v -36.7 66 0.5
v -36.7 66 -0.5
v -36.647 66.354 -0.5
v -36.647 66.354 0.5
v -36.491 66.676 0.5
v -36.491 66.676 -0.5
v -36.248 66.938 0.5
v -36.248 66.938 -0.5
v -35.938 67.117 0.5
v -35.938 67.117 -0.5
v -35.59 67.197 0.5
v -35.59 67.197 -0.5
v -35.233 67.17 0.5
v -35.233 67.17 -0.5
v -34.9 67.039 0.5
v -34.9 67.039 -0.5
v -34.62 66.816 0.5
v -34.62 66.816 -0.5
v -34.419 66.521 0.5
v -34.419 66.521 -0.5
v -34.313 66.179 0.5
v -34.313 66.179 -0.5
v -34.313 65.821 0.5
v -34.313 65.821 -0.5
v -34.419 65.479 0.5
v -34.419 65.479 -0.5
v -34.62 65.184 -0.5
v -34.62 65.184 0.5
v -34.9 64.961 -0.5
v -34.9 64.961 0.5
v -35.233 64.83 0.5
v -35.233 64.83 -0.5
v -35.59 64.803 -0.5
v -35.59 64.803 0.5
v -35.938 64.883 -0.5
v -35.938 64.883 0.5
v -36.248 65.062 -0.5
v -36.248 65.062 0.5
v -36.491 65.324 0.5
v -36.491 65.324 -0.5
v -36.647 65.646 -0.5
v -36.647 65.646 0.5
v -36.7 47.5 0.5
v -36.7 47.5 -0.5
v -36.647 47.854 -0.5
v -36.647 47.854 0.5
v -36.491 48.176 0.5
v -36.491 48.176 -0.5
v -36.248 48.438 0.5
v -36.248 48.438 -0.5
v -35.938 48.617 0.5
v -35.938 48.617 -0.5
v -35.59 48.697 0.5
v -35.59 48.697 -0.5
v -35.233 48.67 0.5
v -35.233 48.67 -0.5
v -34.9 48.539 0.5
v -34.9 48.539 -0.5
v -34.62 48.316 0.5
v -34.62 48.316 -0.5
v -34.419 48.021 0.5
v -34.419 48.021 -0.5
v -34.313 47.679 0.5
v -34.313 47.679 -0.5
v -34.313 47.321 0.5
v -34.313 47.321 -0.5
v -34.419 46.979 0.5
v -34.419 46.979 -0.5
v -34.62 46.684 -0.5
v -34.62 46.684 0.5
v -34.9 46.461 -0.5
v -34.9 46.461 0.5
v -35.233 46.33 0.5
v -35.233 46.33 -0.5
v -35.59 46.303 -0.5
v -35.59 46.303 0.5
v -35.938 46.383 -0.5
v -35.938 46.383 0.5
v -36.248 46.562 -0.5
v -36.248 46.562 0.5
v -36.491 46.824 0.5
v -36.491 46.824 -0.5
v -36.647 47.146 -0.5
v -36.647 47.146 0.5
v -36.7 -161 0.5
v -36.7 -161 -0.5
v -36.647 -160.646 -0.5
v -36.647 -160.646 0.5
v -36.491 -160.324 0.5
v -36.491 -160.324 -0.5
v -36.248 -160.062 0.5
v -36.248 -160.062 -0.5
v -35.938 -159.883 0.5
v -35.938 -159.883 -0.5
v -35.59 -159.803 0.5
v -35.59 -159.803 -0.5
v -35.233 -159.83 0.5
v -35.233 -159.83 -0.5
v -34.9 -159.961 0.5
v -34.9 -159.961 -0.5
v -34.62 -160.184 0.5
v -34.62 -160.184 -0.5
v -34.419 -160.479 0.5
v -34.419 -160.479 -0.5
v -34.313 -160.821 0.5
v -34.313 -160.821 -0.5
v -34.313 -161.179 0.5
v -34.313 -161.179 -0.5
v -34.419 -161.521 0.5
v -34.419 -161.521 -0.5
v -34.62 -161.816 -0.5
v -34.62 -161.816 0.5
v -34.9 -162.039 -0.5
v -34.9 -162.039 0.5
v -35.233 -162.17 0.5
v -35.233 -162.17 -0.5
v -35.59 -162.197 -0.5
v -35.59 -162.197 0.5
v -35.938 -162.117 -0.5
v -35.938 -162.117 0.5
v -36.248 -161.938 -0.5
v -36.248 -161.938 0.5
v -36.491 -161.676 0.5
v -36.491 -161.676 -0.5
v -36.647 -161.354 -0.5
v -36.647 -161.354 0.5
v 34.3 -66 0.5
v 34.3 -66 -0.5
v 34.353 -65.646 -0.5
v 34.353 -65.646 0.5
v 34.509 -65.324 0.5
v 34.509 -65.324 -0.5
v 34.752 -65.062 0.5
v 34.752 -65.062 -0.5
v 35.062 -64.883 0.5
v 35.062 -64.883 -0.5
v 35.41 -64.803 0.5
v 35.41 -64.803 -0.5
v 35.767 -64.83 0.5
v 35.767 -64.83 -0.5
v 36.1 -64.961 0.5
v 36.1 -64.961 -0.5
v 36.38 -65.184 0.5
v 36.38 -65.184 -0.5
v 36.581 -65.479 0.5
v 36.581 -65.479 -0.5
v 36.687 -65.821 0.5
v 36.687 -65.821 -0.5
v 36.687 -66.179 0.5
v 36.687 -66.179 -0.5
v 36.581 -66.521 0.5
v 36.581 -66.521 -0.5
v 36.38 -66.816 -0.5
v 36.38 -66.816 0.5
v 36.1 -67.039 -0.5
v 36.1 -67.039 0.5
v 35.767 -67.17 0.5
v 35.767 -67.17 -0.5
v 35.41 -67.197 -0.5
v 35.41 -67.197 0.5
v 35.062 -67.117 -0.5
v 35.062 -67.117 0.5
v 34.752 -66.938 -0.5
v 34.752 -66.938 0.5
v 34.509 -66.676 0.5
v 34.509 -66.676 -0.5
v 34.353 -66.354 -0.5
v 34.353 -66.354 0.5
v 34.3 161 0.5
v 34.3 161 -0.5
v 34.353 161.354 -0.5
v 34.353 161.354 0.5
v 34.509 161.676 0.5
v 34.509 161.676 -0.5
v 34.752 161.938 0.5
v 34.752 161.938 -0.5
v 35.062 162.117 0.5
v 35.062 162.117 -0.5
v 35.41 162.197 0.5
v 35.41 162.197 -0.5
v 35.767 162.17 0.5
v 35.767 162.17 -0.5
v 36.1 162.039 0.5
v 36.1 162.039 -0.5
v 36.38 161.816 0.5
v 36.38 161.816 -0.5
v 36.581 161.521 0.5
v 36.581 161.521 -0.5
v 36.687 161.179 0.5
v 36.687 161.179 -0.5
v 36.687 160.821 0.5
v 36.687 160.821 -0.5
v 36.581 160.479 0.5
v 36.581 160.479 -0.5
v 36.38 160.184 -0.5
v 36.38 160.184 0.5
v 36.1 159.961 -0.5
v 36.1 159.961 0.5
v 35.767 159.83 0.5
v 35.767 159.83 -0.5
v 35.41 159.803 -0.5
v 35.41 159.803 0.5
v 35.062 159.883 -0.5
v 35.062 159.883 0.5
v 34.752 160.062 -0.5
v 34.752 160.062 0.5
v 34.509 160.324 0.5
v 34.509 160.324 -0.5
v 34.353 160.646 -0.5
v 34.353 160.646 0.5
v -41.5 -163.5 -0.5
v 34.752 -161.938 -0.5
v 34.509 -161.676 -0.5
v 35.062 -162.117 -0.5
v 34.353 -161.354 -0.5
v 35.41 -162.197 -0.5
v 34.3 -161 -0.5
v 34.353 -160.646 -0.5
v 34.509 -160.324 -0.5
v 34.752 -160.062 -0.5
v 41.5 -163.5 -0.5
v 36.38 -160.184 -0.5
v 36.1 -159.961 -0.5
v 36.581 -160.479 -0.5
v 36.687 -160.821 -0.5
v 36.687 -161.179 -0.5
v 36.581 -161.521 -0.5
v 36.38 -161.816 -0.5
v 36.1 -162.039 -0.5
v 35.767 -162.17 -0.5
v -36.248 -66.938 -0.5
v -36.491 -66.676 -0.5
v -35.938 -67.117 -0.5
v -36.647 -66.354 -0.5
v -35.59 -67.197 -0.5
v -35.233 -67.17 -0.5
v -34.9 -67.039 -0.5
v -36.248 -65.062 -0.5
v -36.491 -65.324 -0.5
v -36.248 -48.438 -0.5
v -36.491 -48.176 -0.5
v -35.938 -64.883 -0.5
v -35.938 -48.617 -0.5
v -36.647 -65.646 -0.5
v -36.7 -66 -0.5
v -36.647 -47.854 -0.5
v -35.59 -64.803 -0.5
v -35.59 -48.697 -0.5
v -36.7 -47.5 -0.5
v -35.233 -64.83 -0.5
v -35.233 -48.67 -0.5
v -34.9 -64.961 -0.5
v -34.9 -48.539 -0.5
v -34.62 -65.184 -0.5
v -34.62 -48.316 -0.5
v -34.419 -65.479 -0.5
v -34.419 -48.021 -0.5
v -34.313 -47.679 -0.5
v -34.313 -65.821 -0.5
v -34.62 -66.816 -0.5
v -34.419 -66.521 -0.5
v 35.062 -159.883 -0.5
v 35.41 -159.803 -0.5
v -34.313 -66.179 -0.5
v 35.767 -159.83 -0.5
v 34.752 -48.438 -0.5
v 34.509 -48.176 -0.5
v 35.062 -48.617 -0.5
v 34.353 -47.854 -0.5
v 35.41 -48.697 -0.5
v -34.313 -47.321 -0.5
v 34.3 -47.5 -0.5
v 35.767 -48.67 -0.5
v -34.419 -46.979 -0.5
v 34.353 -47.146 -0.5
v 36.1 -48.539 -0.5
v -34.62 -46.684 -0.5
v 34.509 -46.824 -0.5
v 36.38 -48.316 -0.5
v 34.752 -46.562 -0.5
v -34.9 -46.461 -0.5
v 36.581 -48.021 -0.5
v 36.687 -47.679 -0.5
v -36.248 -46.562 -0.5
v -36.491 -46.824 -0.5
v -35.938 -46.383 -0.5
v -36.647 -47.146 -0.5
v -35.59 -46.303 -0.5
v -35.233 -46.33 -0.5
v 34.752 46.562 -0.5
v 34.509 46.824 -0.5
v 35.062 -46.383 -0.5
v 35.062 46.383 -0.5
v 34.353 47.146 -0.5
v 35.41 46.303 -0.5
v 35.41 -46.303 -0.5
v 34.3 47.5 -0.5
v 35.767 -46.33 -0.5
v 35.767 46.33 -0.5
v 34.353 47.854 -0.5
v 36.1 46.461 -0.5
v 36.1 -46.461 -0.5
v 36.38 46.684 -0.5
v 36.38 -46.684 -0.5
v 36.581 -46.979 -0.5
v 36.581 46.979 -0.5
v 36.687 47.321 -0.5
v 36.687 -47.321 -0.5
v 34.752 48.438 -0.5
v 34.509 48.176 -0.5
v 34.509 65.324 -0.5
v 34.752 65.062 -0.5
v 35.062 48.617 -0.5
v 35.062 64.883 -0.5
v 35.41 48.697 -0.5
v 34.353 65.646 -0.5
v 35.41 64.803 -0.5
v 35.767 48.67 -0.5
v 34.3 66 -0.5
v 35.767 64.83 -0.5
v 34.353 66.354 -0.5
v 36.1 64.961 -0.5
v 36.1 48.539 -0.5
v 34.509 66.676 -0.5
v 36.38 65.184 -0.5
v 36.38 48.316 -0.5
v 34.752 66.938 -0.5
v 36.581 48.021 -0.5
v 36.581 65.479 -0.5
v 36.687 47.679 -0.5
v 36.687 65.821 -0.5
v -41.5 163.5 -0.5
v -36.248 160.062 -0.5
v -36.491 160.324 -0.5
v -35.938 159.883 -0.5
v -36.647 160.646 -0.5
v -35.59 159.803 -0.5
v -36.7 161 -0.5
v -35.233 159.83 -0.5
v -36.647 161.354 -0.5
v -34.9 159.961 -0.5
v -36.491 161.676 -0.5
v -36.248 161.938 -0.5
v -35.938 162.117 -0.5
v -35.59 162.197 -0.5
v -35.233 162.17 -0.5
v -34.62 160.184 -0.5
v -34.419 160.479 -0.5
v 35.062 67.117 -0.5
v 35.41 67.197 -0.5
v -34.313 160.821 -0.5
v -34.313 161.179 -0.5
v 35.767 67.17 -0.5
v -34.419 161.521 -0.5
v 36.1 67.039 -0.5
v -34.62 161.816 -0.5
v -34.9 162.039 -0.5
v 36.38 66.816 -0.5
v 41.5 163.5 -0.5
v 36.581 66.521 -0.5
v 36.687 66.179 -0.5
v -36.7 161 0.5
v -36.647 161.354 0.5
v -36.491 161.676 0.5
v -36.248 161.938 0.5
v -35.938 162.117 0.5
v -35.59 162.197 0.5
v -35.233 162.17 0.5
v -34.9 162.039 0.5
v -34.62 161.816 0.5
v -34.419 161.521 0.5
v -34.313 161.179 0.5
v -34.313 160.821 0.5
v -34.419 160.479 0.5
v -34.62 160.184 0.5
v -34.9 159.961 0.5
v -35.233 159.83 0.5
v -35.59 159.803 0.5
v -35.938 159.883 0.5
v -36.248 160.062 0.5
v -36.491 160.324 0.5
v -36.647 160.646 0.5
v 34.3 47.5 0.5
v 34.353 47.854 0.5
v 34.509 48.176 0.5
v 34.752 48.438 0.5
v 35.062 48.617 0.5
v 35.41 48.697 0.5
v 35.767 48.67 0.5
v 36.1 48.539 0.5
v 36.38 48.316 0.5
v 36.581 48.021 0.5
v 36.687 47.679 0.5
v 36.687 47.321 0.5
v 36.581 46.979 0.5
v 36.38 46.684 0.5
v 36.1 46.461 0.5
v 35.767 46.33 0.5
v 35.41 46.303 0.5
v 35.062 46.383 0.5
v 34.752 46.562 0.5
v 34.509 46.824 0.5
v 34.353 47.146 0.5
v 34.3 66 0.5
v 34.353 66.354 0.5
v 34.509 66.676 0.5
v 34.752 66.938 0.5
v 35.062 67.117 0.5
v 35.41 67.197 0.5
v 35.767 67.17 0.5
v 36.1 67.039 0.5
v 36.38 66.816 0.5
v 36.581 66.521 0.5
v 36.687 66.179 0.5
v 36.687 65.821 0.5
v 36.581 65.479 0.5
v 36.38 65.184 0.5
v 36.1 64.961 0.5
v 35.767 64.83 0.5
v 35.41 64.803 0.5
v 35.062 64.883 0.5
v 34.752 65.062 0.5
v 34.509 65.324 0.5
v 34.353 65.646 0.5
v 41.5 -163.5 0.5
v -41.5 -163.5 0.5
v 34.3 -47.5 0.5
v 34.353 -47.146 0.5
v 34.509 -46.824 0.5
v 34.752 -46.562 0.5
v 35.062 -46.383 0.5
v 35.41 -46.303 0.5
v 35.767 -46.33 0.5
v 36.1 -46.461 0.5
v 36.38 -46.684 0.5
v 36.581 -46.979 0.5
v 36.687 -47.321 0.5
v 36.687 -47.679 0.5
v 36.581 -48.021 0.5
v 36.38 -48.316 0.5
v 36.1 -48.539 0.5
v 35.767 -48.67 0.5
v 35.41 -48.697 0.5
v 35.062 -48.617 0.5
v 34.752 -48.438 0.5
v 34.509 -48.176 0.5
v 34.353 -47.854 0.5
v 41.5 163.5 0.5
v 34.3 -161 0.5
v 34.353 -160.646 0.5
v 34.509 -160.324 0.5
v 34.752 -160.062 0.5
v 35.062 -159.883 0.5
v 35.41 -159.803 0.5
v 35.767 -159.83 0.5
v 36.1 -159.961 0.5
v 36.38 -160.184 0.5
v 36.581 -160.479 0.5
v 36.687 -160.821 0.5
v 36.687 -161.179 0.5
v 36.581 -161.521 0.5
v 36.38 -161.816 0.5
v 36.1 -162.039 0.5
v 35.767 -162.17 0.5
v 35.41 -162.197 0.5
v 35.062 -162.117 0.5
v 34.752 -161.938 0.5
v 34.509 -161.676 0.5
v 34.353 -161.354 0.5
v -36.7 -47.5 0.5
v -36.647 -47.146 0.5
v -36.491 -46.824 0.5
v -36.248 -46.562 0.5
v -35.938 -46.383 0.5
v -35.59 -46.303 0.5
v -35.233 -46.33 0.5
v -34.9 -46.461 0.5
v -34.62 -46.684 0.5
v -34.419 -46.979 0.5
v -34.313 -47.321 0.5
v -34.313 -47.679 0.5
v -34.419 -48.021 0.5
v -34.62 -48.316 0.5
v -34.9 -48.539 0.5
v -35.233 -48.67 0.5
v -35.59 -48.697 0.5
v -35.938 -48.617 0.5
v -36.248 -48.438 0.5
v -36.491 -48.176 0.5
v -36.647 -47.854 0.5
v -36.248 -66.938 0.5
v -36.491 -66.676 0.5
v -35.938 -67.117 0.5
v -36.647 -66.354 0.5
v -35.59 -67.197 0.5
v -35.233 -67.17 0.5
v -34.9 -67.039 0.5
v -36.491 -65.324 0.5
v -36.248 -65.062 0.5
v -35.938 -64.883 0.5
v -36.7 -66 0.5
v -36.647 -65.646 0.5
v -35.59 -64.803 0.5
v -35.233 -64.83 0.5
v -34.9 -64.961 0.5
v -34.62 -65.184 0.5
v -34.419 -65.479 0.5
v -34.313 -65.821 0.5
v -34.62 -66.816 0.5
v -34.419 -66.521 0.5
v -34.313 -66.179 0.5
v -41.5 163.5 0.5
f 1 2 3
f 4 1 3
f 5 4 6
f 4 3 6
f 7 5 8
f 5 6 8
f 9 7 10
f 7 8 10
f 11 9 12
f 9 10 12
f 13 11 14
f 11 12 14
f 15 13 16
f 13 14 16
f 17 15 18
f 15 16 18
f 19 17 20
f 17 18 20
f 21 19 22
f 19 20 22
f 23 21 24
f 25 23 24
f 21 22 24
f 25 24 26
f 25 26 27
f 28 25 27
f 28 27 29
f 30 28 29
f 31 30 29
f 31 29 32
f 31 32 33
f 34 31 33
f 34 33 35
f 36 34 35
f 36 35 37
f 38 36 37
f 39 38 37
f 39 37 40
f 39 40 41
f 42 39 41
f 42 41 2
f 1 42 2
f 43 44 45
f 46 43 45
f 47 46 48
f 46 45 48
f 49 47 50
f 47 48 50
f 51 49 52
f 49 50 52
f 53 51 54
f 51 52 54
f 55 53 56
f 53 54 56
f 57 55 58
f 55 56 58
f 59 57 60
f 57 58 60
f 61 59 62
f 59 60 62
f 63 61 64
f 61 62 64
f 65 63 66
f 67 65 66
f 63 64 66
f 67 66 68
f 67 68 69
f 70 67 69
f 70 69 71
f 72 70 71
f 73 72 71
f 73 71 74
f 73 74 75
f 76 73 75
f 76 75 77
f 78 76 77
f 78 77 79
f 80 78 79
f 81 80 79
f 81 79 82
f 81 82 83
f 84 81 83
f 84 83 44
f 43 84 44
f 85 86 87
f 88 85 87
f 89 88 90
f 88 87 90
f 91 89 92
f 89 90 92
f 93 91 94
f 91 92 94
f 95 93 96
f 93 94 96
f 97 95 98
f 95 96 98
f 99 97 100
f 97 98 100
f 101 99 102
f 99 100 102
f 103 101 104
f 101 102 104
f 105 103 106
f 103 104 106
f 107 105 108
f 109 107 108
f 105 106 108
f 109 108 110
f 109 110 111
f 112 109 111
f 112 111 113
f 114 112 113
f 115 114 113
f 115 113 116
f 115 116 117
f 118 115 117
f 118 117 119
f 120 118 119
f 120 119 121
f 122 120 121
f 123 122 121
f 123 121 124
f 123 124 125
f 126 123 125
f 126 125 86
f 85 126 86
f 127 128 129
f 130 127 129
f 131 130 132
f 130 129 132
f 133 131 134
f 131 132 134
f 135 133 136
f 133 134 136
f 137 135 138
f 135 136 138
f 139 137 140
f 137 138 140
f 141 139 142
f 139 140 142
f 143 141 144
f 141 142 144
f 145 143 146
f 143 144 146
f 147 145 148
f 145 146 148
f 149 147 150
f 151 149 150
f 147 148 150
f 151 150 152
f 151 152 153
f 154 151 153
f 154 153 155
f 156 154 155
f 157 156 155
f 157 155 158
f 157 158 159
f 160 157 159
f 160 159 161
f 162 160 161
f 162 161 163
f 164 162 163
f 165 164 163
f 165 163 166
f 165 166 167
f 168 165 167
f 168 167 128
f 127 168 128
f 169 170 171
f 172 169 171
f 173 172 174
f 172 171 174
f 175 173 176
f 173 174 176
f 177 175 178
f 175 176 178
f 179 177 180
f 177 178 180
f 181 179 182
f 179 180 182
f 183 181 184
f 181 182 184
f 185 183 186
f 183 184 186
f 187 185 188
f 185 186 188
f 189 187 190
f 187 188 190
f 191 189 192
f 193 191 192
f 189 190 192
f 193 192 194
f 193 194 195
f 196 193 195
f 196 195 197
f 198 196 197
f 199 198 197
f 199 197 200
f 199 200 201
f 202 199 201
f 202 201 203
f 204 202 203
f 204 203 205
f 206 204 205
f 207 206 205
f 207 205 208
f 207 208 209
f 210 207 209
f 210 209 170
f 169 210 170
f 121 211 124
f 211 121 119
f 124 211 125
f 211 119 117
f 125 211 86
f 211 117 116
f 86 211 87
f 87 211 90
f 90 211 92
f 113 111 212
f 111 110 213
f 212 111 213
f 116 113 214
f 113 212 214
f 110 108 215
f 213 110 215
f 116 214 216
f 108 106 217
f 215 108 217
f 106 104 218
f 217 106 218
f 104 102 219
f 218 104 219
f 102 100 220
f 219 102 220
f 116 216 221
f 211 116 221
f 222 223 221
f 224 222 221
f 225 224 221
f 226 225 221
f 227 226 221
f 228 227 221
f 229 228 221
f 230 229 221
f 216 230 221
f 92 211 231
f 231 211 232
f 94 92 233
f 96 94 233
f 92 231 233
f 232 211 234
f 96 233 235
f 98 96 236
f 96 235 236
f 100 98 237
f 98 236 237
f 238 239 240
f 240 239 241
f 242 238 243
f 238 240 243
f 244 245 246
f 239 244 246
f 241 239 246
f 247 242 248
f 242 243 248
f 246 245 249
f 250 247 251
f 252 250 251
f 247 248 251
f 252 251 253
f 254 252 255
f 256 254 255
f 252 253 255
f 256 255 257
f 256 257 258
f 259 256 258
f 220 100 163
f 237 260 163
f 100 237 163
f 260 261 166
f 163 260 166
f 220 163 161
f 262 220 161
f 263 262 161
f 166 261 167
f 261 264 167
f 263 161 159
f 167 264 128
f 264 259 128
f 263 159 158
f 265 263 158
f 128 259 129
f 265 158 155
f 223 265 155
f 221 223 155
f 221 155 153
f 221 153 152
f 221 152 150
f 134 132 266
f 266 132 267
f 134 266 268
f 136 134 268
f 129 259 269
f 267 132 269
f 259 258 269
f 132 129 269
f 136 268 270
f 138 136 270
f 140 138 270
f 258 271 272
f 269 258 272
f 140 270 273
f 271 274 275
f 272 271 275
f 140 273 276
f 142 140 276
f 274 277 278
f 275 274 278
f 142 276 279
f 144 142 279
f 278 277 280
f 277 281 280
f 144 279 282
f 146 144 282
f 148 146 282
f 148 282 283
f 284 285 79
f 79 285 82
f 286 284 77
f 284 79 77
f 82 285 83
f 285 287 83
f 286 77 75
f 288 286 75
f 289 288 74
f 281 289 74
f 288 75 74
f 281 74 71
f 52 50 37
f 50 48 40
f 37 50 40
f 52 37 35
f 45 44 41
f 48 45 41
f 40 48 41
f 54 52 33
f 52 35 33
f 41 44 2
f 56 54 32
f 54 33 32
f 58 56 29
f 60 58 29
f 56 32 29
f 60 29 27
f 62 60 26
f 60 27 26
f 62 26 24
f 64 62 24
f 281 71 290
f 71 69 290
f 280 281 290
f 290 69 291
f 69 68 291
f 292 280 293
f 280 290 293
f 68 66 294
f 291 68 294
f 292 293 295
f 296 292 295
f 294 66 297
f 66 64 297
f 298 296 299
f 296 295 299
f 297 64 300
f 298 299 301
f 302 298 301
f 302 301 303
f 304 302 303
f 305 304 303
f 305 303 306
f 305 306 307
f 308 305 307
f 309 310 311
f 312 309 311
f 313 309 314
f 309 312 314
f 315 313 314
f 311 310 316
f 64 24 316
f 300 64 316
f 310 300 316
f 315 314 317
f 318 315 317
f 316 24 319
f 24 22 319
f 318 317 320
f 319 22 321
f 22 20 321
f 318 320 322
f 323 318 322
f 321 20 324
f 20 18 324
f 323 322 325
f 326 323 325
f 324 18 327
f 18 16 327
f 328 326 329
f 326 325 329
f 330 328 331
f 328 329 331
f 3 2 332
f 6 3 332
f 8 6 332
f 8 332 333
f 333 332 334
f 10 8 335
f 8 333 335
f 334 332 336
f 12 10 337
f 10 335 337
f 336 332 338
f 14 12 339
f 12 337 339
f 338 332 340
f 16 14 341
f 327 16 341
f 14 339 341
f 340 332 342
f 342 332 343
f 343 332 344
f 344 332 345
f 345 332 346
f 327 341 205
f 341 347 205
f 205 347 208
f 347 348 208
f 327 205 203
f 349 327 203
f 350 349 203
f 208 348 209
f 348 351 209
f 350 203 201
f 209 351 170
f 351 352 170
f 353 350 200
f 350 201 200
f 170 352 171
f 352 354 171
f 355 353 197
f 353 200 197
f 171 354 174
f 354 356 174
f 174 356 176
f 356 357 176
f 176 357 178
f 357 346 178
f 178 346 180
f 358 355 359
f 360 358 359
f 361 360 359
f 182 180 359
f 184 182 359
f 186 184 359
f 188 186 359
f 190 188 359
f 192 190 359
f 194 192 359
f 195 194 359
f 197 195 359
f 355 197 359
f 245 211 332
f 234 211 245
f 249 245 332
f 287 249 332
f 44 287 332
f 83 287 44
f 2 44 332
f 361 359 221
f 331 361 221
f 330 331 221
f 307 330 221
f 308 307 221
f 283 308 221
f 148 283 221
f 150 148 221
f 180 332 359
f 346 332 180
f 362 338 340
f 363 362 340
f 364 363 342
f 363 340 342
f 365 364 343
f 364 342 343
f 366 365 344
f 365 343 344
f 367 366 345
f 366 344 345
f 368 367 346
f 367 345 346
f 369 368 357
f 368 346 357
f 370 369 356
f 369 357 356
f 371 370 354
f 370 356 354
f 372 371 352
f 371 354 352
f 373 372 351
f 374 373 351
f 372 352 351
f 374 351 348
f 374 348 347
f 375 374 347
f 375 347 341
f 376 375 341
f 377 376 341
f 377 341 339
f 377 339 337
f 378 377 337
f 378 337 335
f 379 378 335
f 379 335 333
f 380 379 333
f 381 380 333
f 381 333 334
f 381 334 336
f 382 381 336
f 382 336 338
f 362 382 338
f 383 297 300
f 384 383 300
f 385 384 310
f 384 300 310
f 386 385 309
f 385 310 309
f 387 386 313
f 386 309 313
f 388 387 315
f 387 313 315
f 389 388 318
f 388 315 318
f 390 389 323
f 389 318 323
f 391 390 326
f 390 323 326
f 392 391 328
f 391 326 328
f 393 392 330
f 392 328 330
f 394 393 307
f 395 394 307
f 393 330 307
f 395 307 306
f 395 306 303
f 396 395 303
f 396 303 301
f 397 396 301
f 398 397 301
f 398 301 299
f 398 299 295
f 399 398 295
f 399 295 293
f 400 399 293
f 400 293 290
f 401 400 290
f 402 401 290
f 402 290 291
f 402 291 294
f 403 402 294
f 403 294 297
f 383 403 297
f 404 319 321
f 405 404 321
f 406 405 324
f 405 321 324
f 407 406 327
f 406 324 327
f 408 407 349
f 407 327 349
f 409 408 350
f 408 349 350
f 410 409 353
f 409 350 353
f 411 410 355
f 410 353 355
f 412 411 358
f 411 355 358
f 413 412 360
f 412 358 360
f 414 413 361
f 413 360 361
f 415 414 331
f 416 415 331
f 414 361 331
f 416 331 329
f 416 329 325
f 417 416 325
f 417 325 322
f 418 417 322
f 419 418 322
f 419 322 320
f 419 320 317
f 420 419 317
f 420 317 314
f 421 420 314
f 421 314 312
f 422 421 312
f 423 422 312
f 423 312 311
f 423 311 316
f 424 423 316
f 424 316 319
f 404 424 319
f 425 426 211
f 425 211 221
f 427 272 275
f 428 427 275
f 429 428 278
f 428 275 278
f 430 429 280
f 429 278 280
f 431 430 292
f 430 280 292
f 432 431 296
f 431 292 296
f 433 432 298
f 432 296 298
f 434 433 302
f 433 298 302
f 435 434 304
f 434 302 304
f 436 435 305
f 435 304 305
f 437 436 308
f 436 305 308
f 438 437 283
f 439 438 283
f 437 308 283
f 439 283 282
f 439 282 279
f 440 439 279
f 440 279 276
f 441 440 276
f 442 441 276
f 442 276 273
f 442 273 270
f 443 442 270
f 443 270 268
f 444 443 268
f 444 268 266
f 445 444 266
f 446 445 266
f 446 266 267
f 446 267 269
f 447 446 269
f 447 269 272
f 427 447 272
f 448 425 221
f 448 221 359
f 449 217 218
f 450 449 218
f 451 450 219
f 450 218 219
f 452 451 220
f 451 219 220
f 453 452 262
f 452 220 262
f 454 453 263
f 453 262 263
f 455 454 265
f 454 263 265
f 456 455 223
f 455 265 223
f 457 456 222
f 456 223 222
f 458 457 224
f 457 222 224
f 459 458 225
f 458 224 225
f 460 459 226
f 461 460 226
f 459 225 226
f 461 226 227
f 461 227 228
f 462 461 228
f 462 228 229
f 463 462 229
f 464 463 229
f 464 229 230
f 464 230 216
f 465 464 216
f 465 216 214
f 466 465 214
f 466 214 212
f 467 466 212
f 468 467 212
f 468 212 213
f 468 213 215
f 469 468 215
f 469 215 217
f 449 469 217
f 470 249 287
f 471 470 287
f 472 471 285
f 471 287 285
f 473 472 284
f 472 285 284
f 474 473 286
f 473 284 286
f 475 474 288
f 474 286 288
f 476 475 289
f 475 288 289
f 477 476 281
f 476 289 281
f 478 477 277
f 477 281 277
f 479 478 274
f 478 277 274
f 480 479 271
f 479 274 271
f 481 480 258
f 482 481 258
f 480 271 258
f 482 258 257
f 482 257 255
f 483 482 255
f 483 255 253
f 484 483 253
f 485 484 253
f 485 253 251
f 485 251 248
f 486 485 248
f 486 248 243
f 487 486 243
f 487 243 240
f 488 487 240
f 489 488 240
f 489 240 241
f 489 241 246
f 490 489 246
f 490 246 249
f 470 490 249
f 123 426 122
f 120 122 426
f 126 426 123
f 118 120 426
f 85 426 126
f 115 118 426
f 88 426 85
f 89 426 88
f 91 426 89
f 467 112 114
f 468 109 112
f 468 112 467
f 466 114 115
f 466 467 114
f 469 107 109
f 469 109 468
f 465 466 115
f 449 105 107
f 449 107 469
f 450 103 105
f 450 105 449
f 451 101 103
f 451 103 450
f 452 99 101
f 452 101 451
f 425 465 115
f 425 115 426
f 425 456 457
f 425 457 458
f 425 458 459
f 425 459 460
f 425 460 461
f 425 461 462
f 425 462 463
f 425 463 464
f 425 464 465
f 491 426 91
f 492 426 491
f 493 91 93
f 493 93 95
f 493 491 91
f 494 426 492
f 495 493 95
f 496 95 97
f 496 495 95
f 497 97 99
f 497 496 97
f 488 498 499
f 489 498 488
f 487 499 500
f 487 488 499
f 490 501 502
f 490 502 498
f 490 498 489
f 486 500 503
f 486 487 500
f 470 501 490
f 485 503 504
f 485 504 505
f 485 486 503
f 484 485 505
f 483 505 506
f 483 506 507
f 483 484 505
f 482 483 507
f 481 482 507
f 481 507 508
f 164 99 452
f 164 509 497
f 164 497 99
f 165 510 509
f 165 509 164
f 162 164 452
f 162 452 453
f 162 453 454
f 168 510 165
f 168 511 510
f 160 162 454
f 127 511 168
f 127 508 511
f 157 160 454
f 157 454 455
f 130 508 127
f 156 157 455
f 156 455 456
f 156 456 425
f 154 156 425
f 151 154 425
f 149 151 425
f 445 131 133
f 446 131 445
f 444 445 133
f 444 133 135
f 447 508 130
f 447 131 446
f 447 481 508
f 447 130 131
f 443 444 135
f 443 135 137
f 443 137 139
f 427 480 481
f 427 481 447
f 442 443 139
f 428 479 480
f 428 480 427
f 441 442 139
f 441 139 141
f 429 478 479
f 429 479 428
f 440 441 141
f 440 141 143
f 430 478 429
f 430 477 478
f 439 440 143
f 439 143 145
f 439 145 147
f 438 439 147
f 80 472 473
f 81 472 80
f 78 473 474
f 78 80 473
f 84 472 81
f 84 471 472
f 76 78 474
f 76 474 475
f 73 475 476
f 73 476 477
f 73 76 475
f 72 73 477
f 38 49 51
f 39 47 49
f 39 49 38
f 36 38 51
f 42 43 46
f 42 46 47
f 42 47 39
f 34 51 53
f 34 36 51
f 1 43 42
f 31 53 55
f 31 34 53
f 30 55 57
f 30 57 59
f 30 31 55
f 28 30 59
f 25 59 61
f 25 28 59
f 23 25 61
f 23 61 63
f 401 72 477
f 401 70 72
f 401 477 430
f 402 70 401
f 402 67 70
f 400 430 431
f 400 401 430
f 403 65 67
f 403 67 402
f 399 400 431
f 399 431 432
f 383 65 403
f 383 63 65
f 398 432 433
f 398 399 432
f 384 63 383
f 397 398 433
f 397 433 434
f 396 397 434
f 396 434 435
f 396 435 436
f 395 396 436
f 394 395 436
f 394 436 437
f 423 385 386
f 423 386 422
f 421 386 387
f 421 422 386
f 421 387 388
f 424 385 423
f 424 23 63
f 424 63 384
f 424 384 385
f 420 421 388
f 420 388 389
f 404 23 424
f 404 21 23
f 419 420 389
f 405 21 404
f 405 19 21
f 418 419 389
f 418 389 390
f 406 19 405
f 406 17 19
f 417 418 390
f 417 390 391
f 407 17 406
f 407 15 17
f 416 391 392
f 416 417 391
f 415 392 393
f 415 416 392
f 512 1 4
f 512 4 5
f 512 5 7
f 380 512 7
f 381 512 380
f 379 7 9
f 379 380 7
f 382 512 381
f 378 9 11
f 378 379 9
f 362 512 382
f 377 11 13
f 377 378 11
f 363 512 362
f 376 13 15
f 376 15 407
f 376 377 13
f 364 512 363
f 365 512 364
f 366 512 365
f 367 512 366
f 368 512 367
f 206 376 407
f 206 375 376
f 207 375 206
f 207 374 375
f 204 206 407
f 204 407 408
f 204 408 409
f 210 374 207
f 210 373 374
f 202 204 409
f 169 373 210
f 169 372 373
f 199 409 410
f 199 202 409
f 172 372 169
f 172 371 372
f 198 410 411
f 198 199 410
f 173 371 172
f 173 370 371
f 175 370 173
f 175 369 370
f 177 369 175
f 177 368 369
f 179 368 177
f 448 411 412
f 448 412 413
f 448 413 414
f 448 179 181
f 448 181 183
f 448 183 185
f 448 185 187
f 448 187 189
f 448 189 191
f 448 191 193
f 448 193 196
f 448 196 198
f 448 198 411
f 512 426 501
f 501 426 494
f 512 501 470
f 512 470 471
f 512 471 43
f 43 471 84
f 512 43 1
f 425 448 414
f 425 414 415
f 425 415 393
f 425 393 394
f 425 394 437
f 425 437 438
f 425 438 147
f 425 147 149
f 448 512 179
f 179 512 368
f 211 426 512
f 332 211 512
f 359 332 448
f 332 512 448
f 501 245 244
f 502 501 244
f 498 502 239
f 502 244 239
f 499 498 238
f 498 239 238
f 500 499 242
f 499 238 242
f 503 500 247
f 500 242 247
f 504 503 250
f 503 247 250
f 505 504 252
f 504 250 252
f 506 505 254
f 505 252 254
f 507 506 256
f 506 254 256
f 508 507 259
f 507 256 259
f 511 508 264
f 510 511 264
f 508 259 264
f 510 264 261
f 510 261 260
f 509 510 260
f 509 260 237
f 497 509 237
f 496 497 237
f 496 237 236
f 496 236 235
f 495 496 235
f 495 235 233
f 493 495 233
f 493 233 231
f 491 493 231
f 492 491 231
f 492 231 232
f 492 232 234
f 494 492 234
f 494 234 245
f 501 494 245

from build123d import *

# Parameters (mm, degrees)
SKETCH1_W           = 83
SKETCH1_H           = 327
BOSS_EXTRUDE1_DEPTH = 0.5
M2_HOLE1_A_D        = 2.4


with BuildPart() as part:
    # Sketch1 → Boss-Extrude1 (new, symmetric)
    with BuildSketch(Plane.XY):
        Rectangle(SKETCH1_W, SKETCH1_H)
    extrude(amount=BOSS_EXTRUDE1_DEPTH, both=True)

    # M2 Hole1 - A (through all)
    with Locations(Plane.XY.offset(0.5)):
        with Locations((-35.5, 161), (35.5, 161), (-35.5, 66), (35.5, 66), (-35.5, 47.5), (35.5, 47.5), (-35.5, -47.5), (35.5, -47.5), (-35.5, -66), (35.5, -66), (-35.5, -161), (35.5, -161)):
            Hole(M2_HOLE1_A_D / 2)


solid = part.part
